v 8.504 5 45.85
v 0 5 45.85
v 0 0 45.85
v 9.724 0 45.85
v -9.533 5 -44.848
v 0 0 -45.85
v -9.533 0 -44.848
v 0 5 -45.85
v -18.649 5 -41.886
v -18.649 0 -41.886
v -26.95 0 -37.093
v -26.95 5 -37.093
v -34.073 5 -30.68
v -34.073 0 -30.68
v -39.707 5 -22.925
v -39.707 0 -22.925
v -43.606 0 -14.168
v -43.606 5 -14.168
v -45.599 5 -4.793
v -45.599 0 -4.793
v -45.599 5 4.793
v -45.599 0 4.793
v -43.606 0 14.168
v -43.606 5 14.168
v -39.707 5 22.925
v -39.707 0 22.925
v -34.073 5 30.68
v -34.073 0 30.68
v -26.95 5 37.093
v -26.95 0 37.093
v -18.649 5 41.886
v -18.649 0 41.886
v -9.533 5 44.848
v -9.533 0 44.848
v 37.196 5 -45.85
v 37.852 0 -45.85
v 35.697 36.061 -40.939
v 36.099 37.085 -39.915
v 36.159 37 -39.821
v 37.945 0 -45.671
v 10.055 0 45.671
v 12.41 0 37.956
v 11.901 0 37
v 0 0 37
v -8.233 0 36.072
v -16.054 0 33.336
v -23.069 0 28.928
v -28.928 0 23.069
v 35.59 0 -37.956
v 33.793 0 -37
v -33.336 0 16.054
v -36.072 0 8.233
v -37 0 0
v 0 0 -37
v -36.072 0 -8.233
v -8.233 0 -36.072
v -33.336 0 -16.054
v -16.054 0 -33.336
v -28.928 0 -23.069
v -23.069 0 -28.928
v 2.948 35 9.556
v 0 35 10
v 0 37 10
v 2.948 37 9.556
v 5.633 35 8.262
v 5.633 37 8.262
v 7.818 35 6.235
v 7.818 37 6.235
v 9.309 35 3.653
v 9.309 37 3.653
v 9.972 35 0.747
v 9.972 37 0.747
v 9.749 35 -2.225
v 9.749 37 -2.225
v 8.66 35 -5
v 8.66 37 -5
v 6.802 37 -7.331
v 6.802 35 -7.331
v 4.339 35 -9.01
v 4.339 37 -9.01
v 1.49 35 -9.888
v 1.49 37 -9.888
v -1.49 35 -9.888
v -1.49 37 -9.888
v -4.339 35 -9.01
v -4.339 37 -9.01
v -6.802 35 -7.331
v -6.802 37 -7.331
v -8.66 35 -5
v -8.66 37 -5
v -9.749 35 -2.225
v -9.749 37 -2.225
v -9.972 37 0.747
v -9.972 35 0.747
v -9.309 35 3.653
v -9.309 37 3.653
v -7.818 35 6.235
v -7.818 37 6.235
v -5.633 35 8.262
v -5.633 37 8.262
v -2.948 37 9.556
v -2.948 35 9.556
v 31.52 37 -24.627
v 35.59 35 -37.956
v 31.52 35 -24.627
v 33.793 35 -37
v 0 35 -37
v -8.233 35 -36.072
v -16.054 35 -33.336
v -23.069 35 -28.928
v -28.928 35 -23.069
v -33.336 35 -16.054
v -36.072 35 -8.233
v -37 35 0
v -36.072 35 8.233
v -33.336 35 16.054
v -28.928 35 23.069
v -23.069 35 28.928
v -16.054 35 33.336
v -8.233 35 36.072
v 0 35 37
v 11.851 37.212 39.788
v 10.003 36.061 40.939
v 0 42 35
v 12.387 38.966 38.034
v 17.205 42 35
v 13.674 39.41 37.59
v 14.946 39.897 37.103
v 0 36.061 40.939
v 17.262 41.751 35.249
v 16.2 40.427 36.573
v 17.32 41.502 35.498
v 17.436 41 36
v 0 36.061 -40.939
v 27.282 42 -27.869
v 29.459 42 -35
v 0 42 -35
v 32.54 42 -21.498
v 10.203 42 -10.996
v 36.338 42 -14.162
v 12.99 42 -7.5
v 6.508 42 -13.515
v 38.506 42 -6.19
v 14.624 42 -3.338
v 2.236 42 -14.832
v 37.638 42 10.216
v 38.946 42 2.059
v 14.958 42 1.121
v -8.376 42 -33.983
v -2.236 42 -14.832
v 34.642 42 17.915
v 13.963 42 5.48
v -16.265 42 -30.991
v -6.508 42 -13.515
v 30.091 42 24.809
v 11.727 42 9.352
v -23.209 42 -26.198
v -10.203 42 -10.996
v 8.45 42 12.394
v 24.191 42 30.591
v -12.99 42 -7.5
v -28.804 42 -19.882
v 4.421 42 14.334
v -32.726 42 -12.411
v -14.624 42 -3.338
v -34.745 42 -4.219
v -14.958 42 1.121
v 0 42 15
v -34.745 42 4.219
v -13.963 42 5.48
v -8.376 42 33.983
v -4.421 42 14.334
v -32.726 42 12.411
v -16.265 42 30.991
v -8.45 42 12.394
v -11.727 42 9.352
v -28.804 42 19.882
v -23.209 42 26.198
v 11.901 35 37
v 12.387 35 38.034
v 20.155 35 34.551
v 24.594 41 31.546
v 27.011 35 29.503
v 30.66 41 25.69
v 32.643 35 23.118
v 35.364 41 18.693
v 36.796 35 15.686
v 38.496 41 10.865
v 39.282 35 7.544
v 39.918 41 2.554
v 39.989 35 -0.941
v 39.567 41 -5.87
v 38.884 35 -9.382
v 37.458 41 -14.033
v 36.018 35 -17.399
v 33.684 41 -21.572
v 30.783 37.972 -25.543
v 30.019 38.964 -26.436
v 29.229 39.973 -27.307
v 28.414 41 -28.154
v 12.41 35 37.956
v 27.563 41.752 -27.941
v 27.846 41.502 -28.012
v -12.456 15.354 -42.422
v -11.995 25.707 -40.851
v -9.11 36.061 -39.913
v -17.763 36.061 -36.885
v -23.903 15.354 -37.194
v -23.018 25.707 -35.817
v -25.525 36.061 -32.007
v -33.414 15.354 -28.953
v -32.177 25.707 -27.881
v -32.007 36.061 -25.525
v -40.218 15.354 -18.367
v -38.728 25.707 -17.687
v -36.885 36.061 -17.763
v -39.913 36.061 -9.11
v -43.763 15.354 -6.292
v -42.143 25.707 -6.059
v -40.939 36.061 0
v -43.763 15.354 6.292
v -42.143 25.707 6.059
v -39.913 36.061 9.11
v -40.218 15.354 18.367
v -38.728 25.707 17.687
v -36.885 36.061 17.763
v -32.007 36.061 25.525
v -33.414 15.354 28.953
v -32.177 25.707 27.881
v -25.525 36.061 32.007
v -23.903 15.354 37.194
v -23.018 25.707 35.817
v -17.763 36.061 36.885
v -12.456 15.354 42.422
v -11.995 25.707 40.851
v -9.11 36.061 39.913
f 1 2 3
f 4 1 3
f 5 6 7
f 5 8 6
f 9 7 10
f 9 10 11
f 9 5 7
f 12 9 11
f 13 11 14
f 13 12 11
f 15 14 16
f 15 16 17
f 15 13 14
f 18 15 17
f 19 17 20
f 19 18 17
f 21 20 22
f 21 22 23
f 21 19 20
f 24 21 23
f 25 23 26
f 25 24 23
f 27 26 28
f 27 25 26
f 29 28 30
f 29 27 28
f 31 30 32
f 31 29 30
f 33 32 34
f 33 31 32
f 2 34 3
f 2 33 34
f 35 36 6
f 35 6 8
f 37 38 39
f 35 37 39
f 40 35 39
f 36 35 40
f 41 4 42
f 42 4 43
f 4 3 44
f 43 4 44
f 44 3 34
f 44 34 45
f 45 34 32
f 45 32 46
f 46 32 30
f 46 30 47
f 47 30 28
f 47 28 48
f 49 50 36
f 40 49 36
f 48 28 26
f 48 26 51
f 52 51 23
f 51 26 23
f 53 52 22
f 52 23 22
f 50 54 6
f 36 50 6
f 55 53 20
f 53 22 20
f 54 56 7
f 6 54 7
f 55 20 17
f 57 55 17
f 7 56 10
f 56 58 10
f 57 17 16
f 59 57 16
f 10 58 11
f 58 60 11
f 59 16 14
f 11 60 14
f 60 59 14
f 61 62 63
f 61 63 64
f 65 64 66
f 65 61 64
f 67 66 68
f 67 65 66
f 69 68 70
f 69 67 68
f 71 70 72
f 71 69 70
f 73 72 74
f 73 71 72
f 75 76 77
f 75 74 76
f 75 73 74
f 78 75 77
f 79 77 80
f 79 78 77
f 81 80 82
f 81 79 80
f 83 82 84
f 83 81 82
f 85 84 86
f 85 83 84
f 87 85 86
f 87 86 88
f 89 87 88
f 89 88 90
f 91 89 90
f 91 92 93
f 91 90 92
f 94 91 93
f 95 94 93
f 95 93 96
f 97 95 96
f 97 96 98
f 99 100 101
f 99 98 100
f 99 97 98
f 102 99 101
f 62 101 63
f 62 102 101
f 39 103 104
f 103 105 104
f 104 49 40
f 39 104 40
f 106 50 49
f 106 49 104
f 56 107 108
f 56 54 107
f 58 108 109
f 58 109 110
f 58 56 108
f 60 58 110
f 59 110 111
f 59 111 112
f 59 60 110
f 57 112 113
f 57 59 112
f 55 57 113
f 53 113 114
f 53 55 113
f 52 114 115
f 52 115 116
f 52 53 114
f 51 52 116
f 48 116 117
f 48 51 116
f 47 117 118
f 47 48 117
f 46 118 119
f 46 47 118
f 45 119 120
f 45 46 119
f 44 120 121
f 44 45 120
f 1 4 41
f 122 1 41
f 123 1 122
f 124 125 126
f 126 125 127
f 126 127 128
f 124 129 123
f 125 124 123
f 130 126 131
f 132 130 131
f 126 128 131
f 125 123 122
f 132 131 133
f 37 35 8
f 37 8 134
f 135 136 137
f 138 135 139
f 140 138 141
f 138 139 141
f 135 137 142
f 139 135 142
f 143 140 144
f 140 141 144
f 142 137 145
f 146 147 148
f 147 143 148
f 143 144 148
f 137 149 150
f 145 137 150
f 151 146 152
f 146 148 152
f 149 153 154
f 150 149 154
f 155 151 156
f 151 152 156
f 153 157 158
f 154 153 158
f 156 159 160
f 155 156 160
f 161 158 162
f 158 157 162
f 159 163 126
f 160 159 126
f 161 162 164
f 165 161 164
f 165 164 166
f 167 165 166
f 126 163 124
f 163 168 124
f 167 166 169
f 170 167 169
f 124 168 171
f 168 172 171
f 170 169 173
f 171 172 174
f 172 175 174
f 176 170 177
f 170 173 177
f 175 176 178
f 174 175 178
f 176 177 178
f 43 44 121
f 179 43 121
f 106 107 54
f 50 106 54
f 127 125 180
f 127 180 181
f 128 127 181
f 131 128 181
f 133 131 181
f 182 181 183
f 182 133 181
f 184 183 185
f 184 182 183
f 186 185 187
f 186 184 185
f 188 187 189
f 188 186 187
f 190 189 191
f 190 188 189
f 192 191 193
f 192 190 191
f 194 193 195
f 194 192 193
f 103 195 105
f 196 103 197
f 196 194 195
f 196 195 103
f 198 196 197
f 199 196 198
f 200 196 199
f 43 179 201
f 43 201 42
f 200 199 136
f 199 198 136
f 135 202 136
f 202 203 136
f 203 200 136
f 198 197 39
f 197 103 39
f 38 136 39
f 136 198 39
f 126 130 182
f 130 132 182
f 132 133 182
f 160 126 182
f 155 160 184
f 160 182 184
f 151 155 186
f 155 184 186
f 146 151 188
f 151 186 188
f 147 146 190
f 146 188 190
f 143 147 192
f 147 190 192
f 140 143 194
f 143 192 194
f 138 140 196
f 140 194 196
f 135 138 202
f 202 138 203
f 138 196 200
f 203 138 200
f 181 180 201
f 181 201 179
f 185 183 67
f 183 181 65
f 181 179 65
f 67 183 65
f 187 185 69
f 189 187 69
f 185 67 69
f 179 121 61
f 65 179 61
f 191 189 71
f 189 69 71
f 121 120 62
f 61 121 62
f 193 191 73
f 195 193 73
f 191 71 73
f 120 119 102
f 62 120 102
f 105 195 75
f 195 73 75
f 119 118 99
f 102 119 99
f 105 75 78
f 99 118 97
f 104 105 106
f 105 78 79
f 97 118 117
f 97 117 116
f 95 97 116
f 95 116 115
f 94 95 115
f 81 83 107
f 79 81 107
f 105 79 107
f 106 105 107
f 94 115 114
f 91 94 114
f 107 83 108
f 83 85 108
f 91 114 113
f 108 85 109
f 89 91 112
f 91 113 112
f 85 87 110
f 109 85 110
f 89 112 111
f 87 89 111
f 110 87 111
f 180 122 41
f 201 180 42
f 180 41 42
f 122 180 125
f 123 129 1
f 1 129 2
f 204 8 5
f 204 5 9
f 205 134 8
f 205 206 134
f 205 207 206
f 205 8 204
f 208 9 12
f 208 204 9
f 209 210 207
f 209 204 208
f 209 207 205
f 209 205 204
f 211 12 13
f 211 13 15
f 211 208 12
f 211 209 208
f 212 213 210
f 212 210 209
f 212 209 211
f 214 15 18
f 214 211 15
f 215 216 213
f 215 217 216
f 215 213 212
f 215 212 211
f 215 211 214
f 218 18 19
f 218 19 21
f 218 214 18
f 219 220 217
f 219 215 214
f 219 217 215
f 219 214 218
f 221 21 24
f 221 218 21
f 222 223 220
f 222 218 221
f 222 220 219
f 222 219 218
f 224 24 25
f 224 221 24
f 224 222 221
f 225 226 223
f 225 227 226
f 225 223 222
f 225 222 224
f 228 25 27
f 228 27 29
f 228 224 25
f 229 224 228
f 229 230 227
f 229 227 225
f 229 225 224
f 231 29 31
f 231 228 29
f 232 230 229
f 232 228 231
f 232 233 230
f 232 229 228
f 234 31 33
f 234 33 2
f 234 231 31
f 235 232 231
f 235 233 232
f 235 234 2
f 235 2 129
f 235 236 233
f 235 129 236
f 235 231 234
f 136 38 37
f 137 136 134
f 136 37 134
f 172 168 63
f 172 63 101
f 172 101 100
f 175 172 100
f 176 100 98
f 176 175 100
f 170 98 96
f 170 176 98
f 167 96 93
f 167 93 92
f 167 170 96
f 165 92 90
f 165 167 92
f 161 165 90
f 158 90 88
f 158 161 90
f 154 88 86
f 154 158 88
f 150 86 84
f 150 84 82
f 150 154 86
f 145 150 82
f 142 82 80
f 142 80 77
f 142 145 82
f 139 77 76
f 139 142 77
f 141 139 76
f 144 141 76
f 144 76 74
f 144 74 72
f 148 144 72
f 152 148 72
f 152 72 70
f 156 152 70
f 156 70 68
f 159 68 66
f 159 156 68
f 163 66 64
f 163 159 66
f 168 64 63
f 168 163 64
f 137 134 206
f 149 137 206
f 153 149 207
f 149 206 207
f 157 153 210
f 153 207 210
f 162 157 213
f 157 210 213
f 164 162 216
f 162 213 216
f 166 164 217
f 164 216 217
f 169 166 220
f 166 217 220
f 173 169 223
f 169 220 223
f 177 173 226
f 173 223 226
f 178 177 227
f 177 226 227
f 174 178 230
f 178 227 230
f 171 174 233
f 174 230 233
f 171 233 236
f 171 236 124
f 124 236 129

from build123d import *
from OCP.BRepFilletAPI import BRepFilletAPI_MakeChamfer

# Parameters (mm, degrees)
REVOLVE1_ANGLE          = 180
BOSS_EXTRUDE1_DEPTH     = 60
CUT_EXTRUDE2_DEPTH      = 87.407305825
CUT_EXTRUDE2_DEPTH_BACK = 87.407305825
SKETCH8_R               = 10
BOSS_EXTRUDE2_DEPTH     = 7
CHAMFER1_SIZE           = 5
CHAMFER1_SIZE2          = 6.012778745
CHAMFER2_SIZE           = 1
CHAMFER2_SIZE2          = 0.800998829
CHAMFER2_SIZE2_2        = 1.505173624
CHAMFER2_SIZE2_3        = 0.802603699
CHAMFER2_SIZE2_4        = 1.49466769


with BuildPart() as part:
    # Sketch2 → Revolve1 (revolve)
    with BuildSketch(Plane(origin=(0, 0, 0), x_dir=(0, 0, -1), z_dir=(1, 0, 0))):
        Polygon((37, 0), (45.85, 0), (45.85, 5), (40, 42), (0, 42), (0, 35), (37, 35), align=None)
    revolve(axis=Axis((0, 0, 0), (0, 1, 0)), revolution_arc=REVOLVE1_ANGLE)

    # Sketch7 → Boss-Extrude1 (add)
    with BuildSketch(Plane(origin=(0, 0, 0), x_dir=(0, 0, -1), z_dir=(1, 0, 0))):
        Polygon((-37, 0), (-37, 35), (37, 35), (37, 0), (45.85, 0), (45.85, 5), (40, 42), (-40, 42), (-45.85, 5), (-45.85, 0), align=None)
    extrude(amount=BOSS_EXTRUDE1_DEPTH)

    # Sketch8 → Cut-Extrude2 (cut, two sides: drawn at the far end of the back side and taken through both)
    with BuildSketch(Plane(origin=(0, 0, 0), x_dir=(1, 0, 0), z_dir=(0, 1, 0)).offset(-CUT_EXTRUDE2_DEPTH_BACK)):
        with Locations(Location((0, 0, 0), (0, 0, 270))):
            Circle(SKETCH8_R)
        Polygon((10, -45.85), (38, 45.85), (138, 45.85), (138, -45.85), align=None)
    extrude(amount=CUT_EXTRUDE2_DEPTH + CUT_EXTRUDE2_DEPTH_BACK, mode=Mode.SUBTRACT)

    # Sketch9 → Boss-Extrude2 (add)
    with BuildSketch(Plane(origin=(0, 42, 0), x_dir=(1, 0, 0), z_dir=(0, 1, 0))):
        with BuildLine():
            Line((31.519782555, 24.627287867), (0, -40))
            ThreePointArc((0, -40), (35.951992397, -17.534373175), (31.519782555, 24.627287867))
        make_face()
    extrude(amount=-BOSS_EXTRUDE2_DEPTH)

    # Chamfer1: one chamfer whose edges measure the first distance from different faces: ONE call of the kernel's chamfer builder (chamfer() names one face for all edges)
    chamfer1_edges_1 = [part.edges().sort_by_distance(p)[0] for p in [
        (-40, 42, 0),
        (5.893129771, 42, 40),
        (18.106870229, 42, -40),
    ]]
    chamfer1_side_1 = [part.faces().sort_by_distance(p)[0] for p in [
        (18.106870229, 42, -38.86862915),
    ]]
    chamfer1_edges_2 = [part.edges().sort_by_distance(p)[0] for p in [
        (0, 42, -10),
        (33.866761506, 42, -32.313643934),
    ]]
    chamfer1 = BRepFilletAPI_MakeChamfer(part.part.solid().wrapped)
    for e in chamfer1_edges_1:
        chamfer1.Add(CHAMFER1_SIZE, CHAMFER1_SIZE2, e.wrapped, chamfer1_side_1[0].wrapped)  # the first distance lies on this face
    for e in chamfer1_edges_2:
        chamfer1.Add(CHAMFER1_SIZE, e.wrapped)
    add(Compound.cast(chamfer1.Shape()), mode=Mode.REPLACE)

    # Chamfer2: one chamfer whose edges measure the first distance from different faces: ONE call of the kernel's chamfer builder (chamfer() names one face for all edges)
    chamfer2_edges_1 = [part.edges().sort_by_distance(p)[0] for p in [
        (39.67158228, 42, 5.115228187),
    ]]
    chamfer2_edges_2 = [part.edges().sort_by_distance(p)[0] for p in [
        (12.702290076, 17.5, 37),
    ]]
    chamfer2_side_2 = [part.faces().sort_by_distance(p)[0] for p in [
        (11.622460622, 15.898187568, 40.536441463),
    ]]
    chamfer2_edges_3 = [part.edges().sort_by_distance(p)[0] for p in [
        (35.297709924, 17.5, -37),
    ]]
    chamfer2_side_3 = [part.faces().sort_by_distance(p)[0] for p in [
        (36.103314257, 17.732760886, -39.638354191),
    ]]
    chamfer2_edges_4 = [part.edges().sort_by_distance(p)[0] for p in [
        (37.250229743, 20.530497592, -43.394502408),
    ]]
    chamfer2_side_4 = [part.faces().sort_by_distance(p)[0] for p in [
        (36.103314257, 17.732760886, -39.638354191),
    ]]
    chamfer2_edges_5 = [part.edges().sort_by_distance(p)[0] for p in [
        (10.749770257, 20.530497592, 43.394502408),
    ]]
    chamfer2_side_5 = [part.faces().sort_by_distance(p)[0] for p in [
        (11.622460622, 15.898187568, 40.536441463),
    ]]
    chamfer2 = BRepFilletAPI_MakeChamfer(part.part.solid().wrapped)
    for e in chamfer2_edges_1:
        chamfer2.Add(CHAMFER2_SIZE, e.wrapped)
    for e in chamfer2_edges_2:
        chamfer2.Add(CHAMFER2_SIZE, CHAMFER2_SIZE2, e.wrapped, chamfer2_side_2[0].wrapped)  # the first distance lies on this face
    for e in chamfer2_edges_3:
        chamfer2.Add(CHAMFER2_SIZE, CHAMFER2_SIZE2_2, e.wrapped, chamfer2_side_3[0].wrapped)  # the first distance lies on this face
    for e in chamfer2_edges_4:
        chamfer2.Add(CHAMFER2_SIZE, CHAMFER2_SIZE2_3, e.wrapped, chamfer2_side_4[0].wrapped)  # the first distance lies on this face
    for e in chamfer2_edges_5:
        chamfer2.Add(CHAMFER2_SIZE, CHAMFER2_SIZE2_4, e.wrapped, chamfer2_side_5[0].wrapped)  # the first distance lies on this face
    add(Compound.cast(chamfer2.Shape()), mode=Mode.REPLACE)


solid = part.part
